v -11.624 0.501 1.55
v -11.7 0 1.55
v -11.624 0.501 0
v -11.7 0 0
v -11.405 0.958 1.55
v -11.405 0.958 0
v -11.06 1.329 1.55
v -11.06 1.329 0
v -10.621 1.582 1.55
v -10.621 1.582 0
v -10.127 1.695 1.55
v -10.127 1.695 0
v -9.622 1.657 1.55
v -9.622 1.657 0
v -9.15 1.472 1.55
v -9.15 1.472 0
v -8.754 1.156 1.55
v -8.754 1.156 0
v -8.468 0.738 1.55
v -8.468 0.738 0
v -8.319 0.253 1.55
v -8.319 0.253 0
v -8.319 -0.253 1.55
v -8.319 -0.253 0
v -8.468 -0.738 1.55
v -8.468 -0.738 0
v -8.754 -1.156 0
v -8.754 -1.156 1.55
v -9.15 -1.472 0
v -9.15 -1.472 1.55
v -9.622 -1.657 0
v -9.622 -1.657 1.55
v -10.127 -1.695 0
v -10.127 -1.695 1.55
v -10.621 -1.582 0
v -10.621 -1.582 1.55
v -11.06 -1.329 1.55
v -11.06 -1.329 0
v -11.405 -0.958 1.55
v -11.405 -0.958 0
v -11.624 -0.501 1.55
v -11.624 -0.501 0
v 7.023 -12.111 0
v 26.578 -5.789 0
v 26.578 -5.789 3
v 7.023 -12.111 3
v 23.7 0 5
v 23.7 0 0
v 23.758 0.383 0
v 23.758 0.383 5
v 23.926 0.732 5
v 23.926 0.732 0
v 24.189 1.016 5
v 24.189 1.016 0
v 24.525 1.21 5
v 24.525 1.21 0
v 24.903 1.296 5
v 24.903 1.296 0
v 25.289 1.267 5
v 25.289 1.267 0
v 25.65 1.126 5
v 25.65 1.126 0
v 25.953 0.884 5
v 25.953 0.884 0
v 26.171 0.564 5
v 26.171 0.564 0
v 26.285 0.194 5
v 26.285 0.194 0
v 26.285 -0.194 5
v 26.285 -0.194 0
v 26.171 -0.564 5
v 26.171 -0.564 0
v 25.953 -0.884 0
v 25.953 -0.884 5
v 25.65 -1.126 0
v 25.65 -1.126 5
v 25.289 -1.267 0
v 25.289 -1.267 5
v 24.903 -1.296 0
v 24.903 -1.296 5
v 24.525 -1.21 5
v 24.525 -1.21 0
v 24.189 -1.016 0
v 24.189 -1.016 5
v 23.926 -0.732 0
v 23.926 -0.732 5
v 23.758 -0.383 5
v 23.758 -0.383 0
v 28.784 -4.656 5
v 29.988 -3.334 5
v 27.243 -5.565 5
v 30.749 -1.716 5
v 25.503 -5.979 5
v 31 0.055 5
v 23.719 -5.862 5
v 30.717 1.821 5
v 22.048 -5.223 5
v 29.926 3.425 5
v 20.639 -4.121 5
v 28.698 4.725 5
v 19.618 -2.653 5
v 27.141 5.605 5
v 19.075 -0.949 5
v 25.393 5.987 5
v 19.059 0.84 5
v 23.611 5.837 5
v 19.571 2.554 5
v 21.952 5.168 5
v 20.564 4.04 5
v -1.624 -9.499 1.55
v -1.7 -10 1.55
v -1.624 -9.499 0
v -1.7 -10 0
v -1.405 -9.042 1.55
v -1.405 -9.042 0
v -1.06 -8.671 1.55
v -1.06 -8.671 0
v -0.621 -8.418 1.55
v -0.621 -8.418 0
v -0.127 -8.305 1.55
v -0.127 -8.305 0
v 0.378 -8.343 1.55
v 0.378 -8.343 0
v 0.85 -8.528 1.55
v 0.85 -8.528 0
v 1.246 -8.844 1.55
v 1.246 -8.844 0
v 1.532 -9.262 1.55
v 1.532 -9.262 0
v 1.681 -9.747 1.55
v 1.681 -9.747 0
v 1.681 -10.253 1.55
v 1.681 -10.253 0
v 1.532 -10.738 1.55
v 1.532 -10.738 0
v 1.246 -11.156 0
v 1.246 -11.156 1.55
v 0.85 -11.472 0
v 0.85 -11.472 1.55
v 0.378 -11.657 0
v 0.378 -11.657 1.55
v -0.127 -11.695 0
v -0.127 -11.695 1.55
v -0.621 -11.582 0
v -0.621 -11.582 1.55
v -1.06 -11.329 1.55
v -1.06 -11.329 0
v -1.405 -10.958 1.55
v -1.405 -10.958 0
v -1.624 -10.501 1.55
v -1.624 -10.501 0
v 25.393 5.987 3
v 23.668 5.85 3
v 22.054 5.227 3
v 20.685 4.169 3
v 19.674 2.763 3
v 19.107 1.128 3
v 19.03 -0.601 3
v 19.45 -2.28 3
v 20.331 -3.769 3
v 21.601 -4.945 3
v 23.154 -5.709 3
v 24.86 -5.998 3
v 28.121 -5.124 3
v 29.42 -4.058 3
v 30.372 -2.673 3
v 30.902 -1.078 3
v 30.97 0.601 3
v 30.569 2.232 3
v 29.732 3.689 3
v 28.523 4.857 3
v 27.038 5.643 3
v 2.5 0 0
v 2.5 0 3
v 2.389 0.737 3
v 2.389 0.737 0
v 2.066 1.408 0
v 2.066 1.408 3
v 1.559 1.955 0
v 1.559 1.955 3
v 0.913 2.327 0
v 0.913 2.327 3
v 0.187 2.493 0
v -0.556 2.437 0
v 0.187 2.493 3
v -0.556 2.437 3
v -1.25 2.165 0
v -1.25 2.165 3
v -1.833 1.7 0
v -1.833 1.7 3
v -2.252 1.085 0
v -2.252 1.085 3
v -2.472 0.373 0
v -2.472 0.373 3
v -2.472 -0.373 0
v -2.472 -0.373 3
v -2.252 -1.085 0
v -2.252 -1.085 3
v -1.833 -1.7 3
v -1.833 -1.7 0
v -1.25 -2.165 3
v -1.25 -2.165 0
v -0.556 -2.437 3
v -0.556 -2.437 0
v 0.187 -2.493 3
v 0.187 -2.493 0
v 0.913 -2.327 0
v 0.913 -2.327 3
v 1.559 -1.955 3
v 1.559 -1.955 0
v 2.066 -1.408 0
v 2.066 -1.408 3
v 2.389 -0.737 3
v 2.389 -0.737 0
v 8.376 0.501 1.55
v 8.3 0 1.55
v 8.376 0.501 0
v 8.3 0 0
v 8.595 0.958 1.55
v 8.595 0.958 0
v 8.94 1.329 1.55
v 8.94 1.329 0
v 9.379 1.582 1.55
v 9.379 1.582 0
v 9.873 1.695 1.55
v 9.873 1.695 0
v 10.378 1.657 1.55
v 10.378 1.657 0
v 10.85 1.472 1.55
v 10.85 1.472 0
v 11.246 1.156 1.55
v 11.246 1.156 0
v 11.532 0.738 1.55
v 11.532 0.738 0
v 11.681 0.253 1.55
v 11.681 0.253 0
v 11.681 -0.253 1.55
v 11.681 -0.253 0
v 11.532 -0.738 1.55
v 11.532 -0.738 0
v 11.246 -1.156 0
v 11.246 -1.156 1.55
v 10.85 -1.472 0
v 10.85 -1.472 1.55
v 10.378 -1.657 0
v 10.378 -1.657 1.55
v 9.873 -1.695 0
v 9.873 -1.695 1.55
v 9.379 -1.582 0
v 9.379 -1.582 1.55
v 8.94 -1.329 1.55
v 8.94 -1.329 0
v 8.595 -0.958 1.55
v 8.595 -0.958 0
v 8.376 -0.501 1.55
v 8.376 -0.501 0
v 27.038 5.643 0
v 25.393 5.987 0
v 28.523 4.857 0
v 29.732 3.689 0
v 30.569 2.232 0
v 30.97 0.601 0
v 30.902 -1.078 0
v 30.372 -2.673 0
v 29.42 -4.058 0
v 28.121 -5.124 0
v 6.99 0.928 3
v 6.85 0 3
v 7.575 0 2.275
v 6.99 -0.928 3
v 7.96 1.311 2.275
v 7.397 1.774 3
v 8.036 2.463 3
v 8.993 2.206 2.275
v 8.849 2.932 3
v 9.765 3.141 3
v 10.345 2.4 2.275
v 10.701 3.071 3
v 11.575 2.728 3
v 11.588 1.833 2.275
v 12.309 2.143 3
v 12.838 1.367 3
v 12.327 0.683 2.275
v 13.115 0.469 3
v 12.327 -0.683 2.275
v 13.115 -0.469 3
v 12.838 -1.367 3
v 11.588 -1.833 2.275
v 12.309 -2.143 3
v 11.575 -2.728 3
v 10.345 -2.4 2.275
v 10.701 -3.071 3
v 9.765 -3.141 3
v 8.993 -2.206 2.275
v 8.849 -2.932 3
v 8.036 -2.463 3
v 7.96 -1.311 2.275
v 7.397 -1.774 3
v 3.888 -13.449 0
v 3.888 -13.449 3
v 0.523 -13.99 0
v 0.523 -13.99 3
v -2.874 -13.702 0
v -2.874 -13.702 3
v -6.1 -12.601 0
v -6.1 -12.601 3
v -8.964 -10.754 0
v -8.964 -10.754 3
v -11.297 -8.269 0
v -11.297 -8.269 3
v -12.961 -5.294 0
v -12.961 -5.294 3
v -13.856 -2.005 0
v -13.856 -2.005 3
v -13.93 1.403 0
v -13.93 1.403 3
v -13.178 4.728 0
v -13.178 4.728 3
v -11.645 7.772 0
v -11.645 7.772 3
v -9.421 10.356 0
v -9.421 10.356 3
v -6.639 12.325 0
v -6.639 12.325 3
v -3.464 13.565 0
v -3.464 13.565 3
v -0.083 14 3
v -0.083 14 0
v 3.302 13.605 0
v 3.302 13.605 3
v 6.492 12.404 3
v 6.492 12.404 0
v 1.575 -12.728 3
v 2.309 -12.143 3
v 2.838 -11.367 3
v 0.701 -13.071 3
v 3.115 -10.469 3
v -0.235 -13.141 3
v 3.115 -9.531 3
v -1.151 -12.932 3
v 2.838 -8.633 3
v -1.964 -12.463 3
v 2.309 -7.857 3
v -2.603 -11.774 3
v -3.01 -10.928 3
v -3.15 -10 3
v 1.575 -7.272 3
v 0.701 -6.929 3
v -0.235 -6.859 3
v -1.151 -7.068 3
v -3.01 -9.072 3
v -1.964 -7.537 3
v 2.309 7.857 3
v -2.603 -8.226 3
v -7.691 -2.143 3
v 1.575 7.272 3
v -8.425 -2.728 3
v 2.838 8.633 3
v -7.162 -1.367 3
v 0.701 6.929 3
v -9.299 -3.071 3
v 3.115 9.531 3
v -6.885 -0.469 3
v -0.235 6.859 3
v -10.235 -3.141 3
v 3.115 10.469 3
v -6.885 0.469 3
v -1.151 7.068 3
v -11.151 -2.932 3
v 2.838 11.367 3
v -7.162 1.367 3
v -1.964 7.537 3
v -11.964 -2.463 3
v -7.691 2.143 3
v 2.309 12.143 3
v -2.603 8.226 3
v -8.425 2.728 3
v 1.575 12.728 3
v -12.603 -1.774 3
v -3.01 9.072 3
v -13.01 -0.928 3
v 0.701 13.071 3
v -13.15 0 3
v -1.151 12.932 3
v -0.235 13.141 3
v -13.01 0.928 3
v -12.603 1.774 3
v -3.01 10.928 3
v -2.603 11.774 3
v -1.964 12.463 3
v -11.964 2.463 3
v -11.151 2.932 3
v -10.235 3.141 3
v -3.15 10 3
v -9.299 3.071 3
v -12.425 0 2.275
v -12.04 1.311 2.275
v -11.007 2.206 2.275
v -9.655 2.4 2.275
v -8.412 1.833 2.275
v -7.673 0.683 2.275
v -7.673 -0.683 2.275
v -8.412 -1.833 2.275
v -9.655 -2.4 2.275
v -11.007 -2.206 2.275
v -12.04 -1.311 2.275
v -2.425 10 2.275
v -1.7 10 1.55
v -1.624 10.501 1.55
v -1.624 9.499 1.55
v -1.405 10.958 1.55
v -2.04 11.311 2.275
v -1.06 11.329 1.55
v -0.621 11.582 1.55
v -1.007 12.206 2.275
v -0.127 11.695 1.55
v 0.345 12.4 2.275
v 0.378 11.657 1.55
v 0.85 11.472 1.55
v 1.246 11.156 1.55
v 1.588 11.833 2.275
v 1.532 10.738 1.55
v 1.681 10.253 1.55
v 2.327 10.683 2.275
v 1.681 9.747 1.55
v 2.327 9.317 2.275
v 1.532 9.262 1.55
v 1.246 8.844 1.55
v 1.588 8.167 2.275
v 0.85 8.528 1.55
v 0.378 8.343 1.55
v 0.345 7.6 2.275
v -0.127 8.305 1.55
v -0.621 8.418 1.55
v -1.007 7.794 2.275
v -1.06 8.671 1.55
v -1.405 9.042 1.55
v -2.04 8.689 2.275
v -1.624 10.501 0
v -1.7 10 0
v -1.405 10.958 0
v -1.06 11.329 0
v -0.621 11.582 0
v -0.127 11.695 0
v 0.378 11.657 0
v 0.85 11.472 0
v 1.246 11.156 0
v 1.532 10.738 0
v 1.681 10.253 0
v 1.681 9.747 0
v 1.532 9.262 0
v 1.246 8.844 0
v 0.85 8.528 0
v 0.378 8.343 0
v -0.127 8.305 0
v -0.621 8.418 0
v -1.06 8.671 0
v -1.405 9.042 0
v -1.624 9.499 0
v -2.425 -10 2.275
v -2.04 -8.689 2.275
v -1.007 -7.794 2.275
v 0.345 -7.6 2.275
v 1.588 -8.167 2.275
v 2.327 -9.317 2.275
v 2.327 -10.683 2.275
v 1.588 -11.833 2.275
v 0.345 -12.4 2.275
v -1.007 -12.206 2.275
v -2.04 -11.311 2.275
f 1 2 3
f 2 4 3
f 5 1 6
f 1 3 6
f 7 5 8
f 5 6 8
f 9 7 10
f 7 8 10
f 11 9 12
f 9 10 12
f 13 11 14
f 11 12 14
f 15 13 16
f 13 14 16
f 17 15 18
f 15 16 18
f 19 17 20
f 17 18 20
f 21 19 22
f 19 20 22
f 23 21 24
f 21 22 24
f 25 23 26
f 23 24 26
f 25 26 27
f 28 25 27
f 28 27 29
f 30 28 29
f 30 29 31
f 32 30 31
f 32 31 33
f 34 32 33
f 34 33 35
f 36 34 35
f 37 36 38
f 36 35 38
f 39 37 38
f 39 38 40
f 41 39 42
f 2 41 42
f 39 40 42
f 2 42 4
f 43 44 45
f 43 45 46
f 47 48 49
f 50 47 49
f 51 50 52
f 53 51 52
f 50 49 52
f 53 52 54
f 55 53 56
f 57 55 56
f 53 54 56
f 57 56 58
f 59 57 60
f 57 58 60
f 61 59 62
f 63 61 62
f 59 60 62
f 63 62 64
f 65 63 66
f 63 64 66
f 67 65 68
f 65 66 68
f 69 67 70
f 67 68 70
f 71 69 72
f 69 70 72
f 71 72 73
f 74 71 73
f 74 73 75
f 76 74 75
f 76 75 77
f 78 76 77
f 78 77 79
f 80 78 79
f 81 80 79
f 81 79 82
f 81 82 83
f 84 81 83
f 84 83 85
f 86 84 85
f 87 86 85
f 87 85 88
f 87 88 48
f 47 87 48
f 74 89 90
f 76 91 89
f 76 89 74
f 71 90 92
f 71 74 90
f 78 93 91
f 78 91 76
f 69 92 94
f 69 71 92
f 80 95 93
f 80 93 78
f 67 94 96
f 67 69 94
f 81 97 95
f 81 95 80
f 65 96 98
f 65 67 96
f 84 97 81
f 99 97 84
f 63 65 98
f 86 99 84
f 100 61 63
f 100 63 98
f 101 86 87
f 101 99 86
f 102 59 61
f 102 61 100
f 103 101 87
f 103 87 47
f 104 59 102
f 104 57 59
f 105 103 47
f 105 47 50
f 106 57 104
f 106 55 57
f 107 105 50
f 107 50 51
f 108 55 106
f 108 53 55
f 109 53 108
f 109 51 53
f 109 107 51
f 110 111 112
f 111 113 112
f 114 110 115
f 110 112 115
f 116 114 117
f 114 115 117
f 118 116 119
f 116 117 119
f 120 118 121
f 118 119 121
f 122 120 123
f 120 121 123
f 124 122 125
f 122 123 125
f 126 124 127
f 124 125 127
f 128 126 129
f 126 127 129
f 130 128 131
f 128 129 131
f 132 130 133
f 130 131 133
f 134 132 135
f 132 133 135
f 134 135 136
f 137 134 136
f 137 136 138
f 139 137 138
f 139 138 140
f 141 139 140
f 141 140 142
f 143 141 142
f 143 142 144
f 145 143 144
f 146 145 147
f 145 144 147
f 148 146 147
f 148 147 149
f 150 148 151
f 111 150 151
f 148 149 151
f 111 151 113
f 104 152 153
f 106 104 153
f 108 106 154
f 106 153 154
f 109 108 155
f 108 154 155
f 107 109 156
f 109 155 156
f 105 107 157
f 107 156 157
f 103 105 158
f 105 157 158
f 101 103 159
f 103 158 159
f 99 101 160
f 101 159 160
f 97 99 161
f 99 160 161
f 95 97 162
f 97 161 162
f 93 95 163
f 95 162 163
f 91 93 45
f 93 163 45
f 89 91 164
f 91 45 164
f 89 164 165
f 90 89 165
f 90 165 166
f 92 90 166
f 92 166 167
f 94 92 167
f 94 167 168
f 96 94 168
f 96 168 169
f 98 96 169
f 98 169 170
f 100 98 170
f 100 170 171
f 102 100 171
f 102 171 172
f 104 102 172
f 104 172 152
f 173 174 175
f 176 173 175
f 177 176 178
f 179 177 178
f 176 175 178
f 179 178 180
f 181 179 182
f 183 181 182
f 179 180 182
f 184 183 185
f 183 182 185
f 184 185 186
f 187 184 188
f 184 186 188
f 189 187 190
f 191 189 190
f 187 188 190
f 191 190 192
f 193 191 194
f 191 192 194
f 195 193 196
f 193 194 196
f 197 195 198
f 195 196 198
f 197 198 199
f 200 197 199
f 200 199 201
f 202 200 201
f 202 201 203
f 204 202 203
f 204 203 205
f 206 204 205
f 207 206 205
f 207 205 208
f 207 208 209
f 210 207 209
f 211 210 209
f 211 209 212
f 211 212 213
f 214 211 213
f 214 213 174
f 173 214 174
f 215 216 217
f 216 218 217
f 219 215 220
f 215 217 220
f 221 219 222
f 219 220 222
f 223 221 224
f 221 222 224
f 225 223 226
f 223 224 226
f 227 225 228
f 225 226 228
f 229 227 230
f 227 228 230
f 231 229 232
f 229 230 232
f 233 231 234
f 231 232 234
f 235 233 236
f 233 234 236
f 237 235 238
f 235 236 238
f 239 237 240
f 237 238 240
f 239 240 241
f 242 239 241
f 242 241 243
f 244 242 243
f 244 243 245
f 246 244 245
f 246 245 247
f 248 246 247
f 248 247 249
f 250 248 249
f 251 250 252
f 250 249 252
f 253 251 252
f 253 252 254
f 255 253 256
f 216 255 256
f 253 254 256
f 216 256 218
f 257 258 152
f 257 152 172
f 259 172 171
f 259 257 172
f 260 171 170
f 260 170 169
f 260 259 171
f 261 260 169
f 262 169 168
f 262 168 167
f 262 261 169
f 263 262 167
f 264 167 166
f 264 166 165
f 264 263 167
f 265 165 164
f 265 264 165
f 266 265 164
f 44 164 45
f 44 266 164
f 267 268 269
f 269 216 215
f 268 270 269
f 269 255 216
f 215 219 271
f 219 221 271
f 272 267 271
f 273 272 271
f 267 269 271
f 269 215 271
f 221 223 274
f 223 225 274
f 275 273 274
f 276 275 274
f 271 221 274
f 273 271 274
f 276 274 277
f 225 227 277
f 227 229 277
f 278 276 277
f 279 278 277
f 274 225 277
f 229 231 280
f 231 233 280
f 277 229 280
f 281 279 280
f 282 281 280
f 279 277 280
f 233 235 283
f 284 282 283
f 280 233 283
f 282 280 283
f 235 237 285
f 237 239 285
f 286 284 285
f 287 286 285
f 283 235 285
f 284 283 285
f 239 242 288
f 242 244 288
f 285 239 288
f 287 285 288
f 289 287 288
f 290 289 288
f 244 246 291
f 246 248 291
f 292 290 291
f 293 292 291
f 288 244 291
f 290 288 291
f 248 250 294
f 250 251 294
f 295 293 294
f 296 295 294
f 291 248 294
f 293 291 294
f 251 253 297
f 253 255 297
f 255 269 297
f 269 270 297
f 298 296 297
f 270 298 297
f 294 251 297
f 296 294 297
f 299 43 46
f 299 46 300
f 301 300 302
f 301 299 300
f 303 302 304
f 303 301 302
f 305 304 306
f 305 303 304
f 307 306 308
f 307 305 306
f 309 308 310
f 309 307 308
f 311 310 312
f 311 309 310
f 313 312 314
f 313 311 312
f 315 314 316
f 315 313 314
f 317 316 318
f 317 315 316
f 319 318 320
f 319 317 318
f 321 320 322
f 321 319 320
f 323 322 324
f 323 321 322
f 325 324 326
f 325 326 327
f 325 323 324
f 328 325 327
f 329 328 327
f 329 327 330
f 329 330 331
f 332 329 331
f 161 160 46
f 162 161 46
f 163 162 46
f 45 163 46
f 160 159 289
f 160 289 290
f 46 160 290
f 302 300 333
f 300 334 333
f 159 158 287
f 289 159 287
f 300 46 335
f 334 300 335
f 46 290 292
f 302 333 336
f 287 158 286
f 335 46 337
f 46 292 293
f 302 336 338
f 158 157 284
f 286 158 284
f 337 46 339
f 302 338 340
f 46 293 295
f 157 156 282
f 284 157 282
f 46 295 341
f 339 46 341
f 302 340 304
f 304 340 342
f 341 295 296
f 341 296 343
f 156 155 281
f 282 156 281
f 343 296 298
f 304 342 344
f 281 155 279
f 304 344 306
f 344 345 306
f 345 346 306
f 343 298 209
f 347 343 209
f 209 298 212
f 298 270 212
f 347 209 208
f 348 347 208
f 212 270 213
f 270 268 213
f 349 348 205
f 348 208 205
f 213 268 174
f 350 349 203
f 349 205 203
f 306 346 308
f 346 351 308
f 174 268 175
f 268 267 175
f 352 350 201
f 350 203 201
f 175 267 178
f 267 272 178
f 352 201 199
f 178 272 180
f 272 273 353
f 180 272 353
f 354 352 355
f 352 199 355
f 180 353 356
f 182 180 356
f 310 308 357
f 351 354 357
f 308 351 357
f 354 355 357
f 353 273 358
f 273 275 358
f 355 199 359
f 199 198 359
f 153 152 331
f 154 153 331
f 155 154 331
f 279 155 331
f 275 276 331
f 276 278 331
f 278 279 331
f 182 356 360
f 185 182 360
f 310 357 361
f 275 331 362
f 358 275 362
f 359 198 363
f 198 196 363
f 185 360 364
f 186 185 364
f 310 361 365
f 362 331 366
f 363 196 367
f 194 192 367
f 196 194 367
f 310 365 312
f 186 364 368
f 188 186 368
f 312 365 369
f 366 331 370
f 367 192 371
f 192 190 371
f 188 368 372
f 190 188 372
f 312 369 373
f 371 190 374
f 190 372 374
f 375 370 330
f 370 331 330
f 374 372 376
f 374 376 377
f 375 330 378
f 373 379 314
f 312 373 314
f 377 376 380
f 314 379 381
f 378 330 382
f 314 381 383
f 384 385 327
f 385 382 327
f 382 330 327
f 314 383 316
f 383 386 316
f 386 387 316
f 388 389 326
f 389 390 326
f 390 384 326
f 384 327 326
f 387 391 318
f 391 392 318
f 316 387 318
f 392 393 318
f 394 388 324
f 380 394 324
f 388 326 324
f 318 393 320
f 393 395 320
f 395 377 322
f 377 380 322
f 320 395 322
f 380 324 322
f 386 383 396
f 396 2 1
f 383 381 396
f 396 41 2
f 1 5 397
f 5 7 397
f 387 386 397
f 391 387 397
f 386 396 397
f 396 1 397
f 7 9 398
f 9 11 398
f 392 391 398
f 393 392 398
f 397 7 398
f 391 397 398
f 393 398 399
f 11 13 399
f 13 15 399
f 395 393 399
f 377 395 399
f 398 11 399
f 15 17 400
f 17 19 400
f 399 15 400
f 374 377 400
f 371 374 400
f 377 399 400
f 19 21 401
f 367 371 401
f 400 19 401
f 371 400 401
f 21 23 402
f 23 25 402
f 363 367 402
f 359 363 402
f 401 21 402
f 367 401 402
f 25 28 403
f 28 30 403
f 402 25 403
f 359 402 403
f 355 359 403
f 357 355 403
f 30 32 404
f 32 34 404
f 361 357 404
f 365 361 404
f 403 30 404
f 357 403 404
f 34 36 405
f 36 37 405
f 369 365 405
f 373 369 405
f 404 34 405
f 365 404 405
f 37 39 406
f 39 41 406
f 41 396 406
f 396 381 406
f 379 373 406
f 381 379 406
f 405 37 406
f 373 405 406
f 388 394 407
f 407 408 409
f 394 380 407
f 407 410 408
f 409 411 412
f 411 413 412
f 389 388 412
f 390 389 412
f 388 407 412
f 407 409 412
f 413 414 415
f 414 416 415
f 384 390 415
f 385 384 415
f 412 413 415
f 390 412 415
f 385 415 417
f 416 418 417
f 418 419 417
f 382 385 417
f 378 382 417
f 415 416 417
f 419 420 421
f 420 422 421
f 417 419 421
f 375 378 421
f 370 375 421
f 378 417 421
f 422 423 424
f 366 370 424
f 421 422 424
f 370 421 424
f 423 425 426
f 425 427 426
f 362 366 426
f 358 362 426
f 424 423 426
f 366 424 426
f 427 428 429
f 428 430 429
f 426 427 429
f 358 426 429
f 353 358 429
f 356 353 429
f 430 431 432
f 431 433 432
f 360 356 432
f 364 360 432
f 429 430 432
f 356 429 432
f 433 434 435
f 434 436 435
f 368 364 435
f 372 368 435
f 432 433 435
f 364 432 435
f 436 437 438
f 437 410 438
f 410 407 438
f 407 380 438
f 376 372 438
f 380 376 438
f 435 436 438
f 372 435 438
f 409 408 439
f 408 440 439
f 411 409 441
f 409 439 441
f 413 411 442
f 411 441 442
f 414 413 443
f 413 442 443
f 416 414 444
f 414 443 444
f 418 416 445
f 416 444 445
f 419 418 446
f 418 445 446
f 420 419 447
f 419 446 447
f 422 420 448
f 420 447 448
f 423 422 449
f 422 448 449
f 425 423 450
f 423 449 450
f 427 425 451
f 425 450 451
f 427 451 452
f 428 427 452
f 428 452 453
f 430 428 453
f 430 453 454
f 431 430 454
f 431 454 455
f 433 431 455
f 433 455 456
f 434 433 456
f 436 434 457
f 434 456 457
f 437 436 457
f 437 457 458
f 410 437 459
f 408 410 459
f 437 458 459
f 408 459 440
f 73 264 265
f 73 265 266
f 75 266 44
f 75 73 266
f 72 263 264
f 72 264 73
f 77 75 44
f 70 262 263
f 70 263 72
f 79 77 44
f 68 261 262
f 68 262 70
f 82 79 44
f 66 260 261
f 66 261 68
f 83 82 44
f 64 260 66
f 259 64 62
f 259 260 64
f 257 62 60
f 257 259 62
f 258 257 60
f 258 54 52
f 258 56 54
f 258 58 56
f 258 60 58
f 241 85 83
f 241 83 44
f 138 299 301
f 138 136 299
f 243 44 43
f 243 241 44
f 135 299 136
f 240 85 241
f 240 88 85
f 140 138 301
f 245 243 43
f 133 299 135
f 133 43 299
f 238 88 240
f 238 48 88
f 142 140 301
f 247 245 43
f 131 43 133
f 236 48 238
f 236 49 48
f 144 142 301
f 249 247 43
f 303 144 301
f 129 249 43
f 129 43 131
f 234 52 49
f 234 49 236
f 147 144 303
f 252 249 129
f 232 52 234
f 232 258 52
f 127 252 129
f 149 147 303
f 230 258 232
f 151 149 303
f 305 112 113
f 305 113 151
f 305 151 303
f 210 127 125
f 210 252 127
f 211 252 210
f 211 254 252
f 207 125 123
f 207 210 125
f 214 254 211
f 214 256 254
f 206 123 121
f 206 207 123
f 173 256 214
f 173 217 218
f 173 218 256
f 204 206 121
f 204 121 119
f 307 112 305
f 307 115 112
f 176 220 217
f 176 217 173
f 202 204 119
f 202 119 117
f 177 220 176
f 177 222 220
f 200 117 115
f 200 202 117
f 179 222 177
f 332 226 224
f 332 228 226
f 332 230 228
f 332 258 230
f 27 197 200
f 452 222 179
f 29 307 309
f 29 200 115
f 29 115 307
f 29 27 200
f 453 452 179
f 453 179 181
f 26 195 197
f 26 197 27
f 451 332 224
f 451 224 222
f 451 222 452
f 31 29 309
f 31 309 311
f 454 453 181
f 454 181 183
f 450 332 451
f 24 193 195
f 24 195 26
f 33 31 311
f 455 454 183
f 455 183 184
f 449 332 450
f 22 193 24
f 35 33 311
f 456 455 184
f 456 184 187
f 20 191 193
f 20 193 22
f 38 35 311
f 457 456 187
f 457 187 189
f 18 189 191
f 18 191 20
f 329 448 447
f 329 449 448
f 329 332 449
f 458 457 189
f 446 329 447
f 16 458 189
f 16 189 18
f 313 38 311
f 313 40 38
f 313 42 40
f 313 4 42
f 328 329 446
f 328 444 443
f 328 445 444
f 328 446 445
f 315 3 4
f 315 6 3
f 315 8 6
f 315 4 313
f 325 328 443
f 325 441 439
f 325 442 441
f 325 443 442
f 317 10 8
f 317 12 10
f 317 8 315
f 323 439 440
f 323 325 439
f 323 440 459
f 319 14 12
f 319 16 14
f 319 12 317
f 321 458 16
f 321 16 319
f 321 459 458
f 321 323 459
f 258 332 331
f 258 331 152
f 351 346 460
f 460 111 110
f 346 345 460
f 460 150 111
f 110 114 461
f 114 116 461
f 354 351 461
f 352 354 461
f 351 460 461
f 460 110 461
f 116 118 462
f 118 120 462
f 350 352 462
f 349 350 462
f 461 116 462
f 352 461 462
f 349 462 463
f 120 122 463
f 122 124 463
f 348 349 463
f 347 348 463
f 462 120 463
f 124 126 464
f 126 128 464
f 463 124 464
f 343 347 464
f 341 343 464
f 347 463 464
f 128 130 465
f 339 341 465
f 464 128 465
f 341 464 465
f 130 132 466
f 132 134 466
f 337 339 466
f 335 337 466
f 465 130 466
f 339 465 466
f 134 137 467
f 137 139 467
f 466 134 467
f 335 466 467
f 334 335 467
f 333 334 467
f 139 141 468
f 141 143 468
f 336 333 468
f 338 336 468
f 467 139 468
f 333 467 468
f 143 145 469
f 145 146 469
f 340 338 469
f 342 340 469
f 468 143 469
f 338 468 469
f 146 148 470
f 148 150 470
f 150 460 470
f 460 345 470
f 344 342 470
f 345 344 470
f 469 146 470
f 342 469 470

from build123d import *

# Parameters (mm, degrees)
BOSS_EXTRUDE1_DEPTH                                 = 3
SKETCH2_R                                           = 6
BOSS_EXTRUDE2_DEPTH                                 = 2
TAP_DRILL_FOR_M3X0_5_TAP1_D                         = 2.6
SKETCH5_R                                           = 2.5
CUT_EXTRUDE1_DEPTH                                  = 35.146742158
CSK_FOR_M3_FLAT_COUNTERSUNK_HEAD_SCREW1_D           = 3.4
CSK_FOR_M3_FLAT_COUNTERSUNK_HEAD_SCREW1_DEPTH       = 6
CSK_FOR_M3_FLAT_COUNTERSUNK_HEAD_SCREW1_CSINK_D     = 6.3
CSK_FOR_M3_FLAT_COUNTERSUNK_HEAD_SCREW1_CSINK_ANGLE = 90
CSK_FOR_M3_FLAT_COUNTERSUNK_HEAD_SCREW1_TIP         = 1.021463052


with BuildPart() as part:
    # Sketch1 → Boss-Extrude1 (new body)
    with BuildSketch(Plane.XY):
        with BuildLine():
            Line((6.492075468, 12.403747664), (25.393424513, 5.987087535))
            ThreePointArc((25.393424513, 5.987087535), (30.969865577, 0.600587203), (26.5781102, -5.788744959))
            Line((26.5781102, -5.788744959), (7.022947864, -12.11107771))
            ThreePointArc((7.022947864, -12.11107771), (-13.996718533, -0.30310114), (6.492075468, 12.403747664))
        make_face()
    extrude(amount=BOSS_EXTRUDE1_DEPTH)

    # Sketch2 → Boss-Extrude2 (add)
    with BuildSketch(Plane.XY.offset(3)):
        with Locations(Location((25, 0, 0), (0, 0, 86.240375256))):
            Circle(SKETCH2_R)
    extrude(amount=BOSS_EXTRUDE2_DEPTH)

    # Tap Drill for M3x0.5 Tap1 (through all)
    with Locations(Plane.XY.offset(5)):
        with Locations((25, 0)):
            Hole(TAP_DRILL_FOR_M3X0_5_TAP1_D / 2)

    # Sketch5 → Cut-Extrude1 (cut, through all)
    with BuildSketch(Plane.XY.offset(3)):
        Circle(SKETCH5_R)
    extrude(amount=-CUT_EXTRUDE1_DEPTH, mode=Mode.SUBTRACT)

    # CSK for M3 Flat Countersunk Head Screw1
    with Locations(Plane.XY.offset(3)):
        with Locations((0, 10), (-10, 0), (0, -10), (10, 0)):
            CounterSinkHole(CSK_FOR_M3_FLAT_COUNTERSUNK_HEAD_SCREW1_D / 2, CSK_FOR_M3_FLAT_COUNTERSUNK_HEAD_SCREW1_CSINK_D / 2, depth=CSK_FOR_M3_FLAT_COUNTERSUNK_HEAD_SCREW1_DEPTH, counter_sink_angle=CSK_FOR_M3_FLAT_COUNTERSUNK_HEAD_SCREW1_CSINK_ANGLE)
            with Locations((0, 0, -(CSK_FOR_M3_FLAT_COUNTERSUNK_HEAD_SCREW1_DEPTH + CSK_FOR_M3_FLAT_COUNTERSUNK_HEAD_SCREW1_TIP / 2))):  # 118° drill point
                Cone(0, CSK_FOR_M3_FLAT_COUNTERSUNK_HEAD_SCREW1_D / 2, CSK_FOR_M3_FLAT_COUNTERSUNK_HEAD_SCREW1_TIP, mode=Mode.SUBTRACT)


solid = part.part
